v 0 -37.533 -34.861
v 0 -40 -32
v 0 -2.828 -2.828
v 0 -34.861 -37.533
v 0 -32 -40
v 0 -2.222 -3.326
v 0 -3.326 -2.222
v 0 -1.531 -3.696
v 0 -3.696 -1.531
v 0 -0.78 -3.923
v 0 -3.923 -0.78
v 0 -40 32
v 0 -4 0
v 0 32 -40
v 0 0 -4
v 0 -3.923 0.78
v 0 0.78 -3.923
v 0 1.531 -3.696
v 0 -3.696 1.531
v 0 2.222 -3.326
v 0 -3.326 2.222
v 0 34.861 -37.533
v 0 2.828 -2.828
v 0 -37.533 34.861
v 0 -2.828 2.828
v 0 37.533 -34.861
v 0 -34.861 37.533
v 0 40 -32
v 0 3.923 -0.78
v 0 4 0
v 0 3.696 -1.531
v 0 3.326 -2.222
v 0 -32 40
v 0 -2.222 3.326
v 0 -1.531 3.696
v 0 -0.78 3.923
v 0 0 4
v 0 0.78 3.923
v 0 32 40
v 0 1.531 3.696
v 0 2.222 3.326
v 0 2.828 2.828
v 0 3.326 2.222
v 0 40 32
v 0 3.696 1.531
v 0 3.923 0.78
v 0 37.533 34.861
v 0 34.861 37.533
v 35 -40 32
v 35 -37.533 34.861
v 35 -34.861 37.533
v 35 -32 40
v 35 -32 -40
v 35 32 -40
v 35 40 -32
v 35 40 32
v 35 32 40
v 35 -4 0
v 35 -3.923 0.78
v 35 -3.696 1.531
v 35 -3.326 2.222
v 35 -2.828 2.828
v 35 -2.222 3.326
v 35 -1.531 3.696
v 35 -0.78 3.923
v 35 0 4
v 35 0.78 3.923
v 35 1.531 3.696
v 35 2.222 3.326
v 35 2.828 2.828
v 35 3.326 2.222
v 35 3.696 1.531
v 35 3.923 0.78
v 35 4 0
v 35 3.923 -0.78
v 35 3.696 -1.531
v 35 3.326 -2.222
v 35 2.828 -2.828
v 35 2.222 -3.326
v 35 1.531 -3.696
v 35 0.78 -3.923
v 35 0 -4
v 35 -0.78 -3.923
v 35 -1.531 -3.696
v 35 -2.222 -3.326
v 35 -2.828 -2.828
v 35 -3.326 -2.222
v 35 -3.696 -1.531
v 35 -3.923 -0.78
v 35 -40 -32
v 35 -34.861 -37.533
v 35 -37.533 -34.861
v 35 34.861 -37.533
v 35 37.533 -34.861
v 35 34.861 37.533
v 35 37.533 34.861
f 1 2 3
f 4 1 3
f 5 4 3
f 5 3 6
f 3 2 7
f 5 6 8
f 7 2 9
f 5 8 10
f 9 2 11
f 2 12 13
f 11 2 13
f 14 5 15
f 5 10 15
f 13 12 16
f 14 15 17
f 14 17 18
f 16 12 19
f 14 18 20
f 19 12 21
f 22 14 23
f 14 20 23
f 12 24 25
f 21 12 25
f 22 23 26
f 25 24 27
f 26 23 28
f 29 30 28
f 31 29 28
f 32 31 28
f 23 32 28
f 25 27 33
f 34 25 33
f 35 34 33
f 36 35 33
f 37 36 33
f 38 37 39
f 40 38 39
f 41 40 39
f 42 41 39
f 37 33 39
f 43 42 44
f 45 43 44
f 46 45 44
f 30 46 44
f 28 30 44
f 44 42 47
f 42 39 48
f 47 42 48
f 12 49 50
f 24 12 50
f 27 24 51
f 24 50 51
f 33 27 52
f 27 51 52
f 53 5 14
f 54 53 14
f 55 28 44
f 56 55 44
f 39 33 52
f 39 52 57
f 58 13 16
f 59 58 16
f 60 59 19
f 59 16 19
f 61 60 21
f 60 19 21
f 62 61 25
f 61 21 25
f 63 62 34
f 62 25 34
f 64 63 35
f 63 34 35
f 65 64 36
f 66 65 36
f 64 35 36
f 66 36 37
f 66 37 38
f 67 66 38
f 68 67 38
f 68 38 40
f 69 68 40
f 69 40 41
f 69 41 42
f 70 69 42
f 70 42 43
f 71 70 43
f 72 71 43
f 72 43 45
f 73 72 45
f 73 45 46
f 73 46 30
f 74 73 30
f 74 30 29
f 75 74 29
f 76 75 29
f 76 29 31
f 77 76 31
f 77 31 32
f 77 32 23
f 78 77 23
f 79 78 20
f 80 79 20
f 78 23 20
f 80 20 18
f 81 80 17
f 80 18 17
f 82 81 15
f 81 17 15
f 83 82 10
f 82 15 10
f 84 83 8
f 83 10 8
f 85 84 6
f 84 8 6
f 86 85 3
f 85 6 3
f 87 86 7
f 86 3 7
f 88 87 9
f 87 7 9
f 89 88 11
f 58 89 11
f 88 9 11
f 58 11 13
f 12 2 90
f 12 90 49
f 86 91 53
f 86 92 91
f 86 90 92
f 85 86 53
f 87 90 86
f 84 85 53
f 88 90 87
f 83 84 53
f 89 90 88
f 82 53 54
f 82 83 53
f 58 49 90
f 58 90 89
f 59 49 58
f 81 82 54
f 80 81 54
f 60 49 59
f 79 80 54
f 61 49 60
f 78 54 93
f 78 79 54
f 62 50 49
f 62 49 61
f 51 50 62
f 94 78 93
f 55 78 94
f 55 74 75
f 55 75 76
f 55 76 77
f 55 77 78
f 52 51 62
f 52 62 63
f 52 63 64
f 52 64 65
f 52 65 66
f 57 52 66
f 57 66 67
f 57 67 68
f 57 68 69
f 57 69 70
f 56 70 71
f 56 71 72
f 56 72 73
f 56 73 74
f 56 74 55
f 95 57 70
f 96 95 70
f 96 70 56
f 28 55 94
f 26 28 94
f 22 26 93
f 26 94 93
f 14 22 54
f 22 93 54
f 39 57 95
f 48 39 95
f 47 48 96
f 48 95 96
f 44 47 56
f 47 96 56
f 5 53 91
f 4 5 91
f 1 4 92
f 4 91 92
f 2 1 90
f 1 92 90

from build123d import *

# Parameters (mm, degrees)
F0_W     = 80
F0_H     = 80
F1_DEPTH = 35
F3_DEPTH = 35.001
F4_R     = 4
F5_DEPTH = 35.001


with BuildPart() as f1:
    # F0 (on Right) → F1 (new body)
    with BuildSketch(Plane.YZ):
        Rectangle(F0_W, F0_H)
    extrude(amount=F1_DEPTH)

    # F2 (on face) → F3 (cut, through all)
    with BuildSketch(Plane.YZ.offset(35)):
        with BuildLine():
            ThreePointArc((-40, 32), (-36.221541, 36.221541), (-32, 40))
            Line((-32, 40), (-40, 40))
            Line((-40, 40), (-40, 32))
        make_face()
        with BuildLine():
            ThreePointArc((-32, -40), (-36.221541, -36.221541), (-40, -32))
            Line((-40, -32), (-40, -40))
            Line((-40, -40), (-32, -40))
        make_face()
        with BuildLine():
            ThreePointArc((40, -32), (36.221541, -36.221541), (32, -40))
            Line((32, -40), (40, -40))
            Line((40, -40), (40, -32))
        make_face()
        with BuildLine():
            ThreePointArc((32, 40), (36.221541, 36.221541), (40, 32))
            Line((40, 32), (40, 40))
            Line((40, 40), (32, 40))
        make_face()
    extrude(amount=-F3_DEPTH, mode=Mode.SUBTRACT)

    # F4 (on face) → F5 (cut, through all)
    with BuildSketch(Plane(origin=(0, 0, 0), x_dir=(0, -1, 0), z_dir=(-1, 0, 0))):
        Circle(F4_R)
    extrude(amount=-F5_DEPTH, mode=Mode.SUBTRACT)


solid = f1.part
